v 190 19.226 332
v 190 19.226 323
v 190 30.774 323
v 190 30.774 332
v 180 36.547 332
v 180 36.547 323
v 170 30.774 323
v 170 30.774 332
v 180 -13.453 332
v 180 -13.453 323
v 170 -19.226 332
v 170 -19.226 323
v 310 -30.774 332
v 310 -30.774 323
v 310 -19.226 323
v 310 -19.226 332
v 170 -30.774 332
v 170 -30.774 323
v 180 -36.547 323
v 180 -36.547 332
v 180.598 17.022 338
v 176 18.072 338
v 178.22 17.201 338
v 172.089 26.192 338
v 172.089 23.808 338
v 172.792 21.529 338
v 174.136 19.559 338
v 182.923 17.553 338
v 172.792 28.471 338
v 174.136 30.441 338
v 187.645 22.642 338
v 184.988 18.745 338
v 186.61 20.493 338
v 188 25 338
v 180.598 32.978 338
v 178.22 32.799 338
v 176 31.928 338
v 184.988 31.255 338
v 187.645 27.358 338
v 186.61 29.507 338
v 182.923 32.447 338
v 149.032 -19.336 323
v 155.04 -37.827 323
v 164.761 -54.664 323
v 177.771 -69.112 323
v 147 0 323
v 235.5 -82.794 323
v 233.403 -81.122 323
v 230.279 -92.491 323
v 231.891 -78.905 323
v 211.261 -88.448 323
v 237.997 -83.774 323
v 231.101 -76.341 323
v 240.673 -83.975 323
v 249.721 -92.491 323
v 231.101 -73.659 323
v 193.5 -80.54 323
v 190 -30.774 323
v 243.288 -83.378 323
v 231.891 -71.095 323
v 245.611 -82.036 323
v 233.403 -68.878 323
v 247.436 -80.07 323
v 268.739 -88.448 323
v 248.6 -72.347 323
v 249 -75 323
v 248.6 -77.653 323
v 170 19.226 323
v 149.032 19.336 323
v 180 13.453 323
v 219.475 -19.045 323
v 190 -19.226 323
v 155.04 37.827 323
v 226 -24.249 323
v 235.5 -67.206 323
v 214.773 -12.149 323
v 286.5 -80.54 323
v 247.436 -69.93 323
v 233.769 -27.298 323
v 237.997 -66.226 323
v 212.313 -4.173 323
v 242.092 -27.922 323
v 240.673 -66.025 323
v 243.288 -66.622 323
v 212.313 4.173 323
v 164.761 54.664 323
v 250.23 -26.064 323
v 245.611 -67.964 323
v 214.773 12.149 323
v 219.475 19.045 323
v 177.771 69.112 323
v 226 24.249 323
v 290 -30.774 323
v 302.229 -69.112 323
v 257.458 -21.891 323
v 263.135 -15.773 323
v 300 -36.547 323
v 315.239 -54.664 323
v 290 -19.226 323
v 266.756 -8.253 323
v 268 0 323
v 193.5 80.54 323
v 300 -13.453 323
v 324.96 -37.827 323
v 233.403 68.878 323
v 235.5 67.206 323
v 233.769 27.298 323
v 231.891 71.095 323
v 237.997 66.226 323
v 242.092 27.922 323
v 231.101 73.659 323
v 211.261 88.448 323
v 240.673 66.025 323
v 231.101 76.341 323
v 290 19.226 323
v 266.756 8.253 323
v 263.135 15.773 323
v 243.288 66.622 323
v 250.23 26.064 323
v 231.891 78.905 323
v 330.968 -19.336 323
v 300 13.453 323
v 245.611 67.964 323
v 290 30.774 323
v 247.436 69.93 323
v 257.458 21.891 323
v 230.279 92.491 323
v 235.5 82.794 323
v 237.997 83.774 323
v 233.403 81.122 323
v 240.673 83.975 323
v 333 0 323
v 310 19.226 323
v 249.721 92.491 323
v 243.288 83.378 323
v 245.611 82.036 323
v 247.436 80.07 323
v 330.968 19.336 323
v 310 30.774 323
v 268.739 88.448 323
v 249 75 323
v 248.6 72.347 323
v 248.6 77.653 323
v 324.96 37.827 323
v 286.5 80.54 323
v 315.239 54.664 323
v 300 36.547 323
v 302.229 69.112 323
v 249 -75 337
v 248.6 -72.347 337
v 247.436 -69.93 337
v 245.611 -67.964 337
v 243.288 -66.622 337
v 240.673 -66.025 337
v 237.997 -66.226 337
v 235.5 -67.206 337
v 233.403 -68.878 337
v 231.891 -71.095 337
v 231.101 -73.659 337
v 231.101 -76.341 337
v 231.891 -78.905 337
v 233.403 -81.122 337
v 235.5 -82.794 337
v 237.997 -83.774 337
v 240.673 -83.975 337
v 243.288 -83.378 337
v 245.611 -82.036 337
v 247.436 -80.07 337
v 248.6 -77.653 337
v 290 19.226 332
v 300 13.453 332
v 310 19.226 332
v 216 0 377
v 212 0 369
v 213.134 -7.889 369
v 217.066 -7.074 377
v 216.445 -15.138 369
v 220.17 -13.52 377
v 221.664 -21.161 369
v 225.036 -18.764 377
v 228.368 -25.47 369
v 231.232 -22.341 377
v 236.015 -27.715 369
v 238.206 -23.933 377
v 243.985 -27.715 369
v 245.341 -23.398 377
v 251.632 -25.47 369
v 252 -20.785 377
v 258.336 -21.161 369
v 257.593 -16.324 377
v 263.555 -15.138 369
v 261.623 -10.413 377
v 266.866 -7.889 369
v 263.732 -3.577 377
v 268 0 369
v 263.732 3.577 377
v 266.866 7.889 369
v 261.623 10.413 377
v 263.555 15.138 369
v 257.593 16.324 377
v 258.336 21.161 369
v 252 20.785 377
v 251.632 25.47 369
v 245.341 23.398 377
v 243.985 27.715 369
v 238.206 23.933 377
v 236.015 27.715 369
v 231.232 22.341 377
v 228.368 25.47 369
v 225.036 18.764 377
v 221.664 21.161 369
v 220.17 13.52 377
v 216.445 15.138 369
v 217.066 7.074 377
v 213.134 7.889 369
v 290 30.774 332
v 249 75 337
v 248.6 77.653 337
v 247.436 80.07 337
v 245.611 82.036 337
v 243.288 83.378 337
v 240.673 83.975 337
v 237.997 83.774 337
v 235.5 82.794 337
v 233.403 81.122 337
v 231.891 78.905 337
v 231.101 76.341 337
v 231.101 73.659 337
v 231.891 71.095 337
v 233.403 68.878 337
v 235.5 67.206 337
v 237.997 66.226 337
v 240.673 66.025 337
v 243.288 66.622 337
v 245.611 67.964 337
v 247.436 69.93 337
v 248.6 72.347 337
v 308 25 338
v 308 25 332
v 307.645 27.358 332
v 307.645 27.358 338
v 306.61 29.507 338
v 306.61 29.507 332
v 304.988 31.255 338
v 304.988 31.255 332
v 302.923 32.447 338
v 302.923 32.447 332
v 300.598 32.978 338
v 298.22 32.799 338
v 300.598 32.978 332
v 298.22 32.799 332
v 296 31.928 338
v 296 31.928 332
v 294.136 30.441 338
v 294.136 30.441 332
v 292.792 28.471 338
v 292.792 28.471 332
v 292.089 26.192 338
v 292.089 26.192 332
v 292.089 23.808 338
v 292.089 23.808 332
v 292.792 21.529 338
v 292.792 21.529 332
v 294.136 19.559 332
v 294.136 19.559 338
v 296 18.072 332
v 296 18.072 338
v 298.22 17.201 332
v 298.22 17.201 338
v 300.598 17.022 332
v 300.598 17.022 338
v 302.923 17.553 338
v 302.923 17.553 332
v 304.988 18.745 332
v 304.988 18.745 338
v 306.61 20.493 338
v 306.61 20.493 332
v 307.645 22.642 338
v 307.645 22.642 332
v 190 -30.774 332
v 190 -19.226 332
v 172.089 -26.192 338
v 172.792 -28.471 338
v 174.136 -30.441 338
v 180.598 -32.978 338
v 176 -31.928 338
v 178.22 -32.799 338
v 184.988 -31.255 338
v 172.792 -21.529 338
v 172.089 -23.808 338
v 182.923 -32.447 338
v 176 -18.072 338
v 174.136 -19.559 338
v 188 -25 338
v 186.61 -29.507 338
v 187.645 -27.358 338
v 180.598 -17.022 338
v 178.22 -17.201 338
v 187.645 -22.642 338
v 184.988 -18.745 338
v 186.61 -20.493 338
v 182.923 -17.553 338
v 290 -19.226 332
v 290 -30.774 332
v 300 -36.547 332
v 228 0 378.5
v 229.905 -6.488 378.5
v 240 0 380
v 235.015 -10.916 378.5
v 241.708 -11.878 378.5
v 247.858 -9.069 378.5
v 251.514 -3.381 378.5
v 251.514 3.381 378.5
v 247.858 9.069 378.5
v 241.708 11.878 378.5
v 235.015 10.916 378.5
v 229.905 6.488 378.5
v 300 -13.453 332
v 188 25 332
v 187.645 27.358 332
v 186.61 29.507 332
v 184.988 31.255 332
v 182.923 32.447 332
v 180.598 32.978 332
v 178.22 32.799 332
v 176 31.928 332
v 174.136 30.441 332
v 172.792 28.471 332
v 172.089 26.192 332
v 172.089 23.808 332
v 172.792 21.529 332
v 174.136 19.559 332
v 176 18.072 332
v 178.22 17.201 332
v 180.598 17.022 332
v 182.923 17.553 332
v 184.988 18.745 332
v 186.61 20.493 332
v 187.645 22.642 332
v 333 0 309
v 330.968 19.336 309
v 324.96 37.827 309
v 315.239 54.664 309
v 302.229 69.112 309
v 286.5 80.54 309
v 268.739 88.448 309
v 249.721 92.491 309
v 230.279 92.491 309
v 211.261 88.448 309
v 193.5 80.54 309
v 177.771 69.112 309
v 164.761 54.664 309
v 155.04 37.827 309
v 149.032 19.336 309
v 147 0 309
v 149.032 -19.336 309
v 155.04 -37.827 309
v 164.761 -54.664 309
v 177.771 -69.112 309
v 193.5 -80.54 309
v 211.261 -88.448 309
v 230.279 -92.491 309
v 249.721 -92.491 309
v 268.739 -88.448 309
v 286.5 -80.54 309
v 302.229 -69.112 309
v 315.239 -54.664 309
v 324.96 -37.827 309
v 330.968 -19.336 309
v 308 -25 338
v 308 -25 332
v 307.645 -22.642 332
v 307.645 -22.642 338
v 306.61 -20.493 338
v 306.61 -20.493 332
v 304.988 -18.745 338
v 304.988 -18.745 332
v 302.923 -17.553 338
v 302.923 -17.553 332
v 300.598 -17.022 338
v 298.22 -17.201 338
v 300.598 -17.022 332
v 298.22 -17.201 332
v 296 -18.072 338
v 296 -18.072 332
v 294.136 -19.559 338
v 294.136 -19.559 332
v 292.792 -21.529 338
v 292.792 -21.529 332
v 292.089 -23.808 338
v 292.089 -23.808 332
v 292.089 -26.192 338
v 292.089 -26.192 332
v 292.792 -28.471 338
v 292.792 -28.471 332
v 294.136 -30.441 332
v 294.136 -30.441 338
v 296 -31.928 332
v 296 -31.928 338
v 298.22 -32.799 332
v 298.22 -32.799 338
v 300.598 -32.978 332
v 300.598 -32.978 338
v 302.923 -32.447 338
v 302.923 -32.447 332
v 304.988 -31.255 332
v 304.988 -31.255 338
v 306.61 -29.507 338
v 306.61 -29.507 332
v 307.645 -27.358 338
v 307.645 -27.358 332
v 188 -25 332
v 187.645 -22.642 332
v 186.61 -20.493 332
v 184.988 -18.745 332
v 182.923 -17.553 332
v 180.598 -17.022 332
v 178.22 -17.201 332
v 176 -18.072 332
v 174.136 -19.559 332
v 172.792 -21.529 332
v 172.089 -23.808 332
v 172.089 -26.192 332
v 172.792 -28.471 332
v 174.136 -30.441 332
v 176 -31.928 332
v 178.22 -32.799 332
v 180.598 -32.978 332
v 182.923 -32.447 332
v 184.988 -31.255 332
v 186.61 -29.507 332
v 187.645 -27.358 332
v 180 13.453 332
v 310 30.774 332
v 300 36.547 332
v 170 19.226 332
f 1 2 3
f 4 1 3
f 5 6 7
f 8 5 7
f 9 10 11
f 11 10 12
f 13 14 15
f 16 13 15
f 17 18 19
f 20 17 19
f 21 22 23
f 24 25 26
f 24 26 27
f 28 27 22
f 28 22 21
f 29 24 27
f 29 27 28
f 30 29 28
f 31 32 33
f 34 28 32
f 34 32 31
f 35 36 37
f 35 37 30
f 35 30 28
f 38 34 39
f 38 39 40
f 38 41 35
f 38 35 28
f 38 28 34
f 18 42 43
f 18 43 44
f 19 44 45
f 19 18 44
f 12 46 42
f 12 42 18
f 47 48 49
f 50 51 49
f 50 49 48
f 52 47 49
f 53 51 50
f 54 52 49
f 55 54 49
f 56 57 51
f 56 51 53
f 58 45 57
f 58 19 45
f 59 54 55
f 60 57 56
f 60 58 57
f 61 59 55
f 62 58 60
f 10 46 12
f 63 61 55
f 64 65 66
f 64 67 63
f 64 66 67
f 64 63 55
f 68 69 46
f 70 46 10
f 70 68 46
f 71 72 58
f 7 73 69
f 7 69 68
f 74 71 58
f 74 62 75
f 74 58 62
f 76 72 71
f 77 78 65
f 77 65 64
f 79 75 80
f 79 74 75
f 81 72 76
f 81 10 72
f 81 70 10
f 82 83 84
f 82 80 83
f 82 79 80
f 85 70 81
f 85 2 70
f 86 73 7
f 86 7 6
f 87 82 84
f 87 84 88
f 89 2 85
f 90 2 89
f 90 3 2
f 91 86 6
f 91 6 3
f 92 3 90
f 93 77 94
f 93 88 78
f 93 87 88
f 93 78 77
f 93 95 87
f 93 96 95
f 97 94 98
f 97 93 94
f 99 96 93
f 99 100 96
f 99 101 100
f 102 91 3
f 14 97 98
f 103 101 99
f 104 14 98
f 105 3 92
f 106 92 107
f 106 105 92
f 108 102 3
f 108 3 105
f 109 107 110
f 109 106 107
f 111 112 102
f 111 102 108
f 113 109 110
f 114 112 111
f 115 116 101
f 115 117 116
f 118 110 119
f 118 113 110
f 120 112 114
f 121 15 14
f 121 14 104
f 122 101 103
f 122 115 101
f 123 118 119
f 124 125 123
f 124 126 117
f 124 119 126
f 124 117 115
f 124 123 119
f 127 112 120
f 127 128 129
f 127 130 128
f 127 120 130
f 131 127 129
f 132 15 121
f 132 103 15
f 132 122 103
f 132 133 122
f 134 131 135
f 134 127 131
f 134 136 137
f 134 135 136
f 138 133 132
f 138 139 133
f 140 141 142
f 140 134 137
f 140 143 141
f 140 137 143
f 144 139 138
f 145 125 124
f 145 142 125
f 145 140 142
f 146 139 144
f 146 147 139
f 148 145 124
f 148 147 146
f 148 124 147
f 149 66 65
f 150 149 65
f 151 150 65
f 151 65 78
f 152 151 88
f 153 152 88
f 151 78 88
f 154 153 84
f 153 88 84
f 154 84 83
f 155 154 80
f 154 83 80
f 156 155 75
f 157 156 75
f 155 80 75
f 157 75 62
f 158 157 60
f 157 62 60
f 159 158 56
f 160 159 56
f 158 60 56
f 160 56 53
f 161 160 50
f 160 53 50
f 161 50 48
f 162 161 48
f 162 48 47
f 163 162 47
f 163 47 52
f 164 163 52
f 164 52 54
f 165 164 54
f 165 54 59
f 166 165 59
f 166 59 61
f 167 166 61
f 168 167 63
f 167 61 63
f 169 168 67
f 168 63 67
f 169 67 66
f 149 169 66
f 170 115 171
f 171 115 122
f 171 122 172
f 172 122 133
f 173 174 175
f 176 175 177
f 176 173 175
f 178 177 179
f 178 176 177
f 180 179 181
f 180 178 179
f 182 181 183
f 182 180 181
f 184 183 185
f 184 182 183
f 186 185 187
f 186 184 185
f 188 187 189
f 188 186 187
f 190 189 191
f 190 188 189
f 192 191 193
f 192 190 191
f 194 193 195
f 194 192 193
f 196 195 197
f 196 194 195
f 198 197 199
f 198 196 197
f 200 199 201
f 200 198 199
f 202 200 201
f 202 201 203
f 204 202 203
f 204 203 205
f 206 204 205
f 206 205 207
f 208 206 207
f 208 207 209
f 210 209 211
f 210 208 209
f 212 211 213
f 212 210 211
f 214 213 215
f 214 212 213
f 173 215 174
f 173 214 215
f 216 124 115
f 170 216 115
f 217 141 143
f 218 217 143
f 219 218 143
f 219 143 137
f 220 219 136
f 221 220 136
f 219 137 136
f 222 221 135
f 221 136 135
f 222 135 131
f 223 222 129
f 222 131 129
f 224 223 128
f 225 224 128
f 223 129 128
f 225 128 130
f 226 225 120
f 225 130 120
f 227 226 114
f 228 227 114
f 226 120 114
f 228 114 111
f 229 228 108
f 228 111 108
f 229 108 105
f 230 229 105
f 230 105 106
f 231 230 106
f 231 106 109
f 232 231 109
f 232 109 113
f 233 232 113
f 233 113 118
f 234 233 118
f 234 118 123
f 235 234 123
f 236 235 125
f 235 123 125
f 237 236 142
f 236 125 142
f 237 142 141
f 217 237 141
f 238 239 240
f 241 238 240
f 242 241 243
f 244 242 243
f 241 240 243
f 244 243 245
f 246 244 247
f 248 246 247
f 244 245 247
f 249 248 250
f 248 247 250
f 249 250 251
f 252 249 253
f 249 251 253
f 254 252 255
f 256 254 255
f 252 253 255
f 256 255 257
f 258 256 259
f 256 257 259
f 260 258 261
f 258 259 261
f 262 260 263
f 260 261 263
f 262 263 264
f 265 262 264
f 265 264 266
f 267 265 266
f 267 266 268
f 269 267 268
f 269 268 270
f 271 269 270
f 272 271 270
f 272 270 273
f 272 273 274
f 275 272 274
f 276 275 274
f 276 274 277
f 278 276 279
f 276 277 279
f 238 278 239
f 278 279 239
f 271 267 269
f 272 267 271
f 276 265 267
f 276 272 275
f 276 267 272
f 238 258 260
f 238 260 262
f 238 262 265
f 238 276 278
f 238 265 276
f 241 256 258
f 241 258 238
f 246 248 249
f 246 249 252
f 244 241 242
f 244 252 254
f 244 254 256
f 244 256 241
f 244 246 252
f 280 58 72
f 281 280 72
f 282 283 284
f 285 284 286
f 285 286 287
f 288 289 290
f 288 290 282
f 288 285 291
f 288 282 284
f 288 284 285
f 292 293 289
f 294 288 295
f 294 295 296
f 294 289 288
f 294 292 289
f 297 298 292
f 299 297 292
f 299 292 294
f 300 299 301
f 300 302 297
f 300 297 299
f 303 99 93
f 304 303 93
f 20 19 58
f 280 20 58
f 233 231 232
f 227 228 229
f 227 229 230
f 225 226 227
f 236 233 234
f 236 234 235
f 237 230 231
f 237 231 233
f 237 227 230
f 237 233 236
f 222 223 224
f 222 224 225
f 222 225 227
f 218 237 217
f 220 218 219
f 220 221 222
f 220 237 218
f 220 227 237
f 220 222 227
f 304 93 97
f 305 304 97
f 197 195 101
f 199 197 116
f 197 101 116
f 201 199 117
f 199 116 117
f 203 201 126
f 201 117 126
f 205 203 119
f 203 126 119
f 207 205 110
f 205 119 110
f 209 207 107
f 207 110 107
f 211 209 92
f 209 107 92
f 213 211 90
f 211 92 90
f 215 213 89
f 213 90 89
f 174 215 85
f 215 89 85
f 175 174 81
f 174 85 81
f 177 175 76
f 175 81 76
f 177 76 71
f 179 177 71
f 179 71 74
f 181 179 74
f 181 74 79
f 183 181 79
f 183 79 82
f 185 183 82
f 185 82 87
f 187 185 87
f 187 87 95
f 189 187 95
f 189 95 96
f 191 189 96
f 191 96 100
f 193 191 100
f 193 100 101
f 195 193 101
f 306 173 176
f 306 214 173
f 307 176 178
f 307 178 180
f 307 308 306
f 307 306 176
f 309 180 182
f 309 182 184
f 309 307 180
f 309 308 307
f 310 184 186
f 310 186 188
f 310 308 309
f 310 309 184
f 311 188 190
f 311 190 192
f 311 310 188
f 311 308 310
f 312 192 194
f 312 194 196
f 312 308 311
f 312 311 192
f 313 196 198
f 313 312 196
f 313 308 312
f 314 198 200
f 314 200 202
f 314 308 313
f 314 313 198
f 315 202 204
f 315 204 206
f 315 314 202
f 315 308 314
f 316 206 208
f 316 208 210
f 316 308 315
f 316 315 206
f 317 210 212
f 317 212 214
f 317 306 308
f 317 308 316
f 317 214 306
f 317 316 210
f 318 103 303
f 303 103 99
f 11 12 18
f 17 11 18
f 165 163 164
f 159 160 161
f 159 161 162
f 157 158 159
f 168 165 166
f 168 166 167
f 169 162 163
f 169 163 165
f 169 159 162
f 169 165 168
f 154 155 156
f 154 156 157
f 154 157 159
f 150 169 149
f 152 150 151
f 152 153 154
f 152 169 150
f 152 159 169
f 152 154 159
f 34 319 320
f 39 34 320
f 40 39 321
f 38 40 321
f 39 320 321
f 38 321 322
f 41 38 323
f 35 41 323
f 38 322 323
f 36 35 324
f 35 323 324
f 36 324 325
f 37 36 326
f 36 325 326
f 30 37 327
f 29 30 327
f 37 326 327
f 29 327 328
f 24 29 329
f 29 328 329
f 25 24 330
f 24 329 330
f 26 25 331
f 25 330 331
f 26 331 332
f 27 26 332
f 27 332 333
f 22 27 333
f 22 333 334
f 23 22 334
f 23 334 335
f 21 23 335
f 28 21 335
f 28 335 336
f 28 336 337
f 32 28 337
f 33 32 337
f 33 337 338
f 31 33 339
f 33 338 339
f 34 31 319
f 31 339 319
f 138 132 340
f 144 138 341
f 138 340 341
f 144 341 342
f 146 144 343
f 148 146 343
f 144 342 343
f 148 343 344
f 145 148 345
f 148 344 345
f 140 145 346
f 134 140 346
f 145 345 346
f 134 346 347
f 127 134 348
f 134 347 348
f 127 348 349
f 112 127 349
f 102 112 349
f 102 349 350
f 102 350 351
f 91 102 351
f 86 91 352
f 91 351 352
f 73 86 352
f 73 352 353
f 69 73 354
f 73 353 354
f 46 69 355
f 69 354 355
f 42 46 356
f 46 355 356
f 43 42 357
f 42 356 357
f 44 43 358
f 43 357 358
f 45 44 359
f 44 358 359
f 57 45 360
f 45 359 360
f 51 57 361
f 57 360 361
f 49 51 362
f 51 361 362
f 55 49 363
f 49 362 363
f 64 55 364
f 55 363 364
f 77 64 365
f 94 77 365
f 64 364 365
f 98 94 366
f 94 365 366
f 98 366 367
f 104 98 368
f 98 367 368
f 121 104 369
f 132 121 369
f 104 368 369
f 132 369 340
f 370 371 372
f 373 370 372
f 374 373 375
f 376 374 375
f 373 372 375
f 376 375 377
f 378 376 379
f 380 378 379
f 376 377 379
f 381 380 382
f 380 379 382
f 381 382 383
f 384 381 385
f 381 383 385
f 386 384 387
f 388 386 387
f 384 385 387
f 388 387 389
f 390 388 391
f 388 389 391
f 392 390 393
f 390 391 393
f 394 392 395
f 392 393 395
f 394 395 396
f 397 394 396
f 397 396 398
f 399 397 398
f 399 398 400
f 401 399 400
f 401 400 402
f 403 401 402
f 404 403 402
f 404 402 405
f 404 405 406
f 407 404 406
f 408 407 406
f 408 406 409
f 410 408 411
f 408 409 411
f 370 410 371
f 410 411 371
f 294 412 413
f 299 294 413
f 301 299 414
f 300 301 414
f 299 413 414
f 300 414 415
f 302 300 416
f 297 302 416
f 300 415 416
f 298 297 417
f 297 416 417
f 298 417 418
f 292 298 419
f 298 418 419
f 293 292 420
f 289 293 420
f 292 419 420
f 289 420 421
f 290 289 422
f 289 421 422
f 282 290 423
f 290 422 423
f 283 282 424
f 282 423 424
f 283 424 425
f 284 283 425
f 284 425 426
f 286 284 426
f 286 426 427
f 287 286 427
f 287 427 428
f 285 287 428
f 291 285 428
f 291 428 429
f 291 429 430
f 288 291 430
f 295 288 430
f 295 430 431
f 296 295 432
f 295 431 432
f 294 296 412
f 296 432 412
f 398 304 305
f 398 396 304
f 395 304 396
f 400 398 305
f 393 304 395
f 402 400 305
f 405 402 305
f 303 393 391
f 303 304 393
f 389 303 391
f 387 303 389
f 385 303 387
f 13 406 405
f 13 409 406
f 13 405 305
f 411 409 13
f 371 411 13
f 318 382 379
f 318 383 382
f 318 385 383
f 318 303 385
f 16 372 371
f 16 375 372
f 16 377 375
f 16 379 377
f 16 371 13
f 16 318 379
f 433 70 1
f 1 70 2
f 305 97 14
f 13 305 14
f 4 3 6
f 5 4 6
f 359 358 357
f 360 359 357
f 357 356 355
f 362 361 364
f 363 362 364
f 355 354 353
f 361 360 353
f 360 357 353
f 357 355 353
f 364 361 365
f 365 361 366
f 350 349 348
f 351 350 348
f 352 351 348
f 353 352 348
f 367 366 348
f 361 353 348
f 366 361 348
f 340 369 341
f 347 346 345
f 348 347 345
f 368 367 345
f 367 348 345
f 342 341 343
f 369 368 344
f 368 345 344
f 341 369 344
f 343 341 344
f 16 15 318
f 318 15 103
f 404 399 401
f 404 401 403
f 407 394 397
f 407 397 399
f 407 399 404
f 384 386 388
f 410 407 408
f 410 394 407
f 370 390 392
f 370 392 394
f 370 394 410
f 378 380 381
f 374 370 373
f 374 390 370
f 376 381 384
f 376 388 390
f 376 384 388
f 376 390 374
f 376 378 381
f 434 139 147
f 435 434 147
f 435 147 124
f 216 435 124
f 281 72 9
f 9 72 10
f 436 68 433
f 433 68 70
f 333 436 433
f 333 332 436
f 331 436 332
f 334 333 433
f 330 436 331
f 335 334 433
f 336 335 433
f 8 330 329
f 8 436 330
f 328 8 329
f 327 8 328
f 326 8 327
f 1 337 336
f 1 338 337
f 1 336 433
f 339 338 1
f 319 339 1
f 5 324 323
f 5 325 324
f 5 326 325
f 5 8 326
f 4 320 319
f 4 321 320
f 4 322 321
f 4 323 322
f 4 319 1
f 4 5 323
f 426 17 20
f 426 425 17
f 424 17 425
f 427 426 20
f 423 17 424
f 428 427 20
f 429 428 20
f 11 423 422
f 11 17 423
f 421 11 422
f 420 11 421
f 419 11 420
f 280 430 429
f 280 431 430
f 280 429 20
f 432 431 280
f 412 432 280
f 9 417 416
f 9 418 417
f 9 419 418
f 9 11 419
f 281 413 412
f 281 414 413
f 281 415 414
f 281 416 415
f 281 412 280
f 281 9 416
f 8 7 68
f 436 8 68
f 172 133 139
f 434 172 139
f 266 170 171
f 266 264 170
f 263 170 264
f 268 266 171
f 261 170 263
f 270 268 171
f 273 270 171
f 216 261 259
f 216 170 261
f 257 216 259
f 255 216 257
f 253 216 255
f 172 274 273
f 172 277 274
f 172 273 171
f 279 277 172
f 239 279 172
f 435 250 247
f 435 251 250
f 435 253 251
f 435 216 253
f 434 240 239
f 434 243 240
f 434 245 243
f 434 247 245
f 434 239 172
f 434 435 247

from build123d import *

# Parameters (mm, degrees)
EXTRUDE_START       = 309
EXTRUDE_SKETCH_1_R  = 93
EXTRUDE_1_DEPTH     = 14
EXTRUDE_START_2     = 323
EXTRUDE_SKETCH_2_R  = 28
EXTRUDE_2_DEPTH     = 46
EXTRUDE_3_DEPTH     = 9
EXTRUDE_START_3     = 332
EXTRUDE_SKETCH_4_R  = 8
EXTRUDE_4_DEPTH     = 6
EXTRUDE_5_DEPTH     = 9
EXTRUDE_SKETCH_6_R  = 8
EXTRUDE_6_DEPTH     = 6
EXTRUDE_7_DEPTH     = 9
EXTRUDE_SKETCH_8_R  = 8
EXTRUDE_8_DEPTH     = 6
EXTRUDE_9_DEPTH     = 9
EXTRUDE_SKETCH_10_R = 8
EXTRUDE_10_DEPTH    = 6
EXTRUDE_SKETCH_11_R = 9
EXTRUDE_11_DEPTH    = 14
EXTRUDE_SKETCH_12_R = 9
EXTRUDE_12_DEPTH    = 14


with BuildPart() as part:
    # Extrude sketch 1 → Extrude 1 (new body)
    with BuildSketch(Plane.XY.offset(EXTRUDE_START)):
        with Locations((240, 0)):
            Circle(EXTRUDE_SKETCH_1_R)
    extrude(amount=EXTRUDE_1_DEPTH)


with BuildPart() as body_2:
    # Extrude sketch 2 → Extrude 2 (new body)
    with BuildSketch(Plane.XY.offset(EXTRUDE_START_2)):
        with Locations((240, 0)):
            Circle(EXTRUDE_SKETCH_2_R)
    extrude(amount=EXTRUDE_2_DEPTH)


with BuildPart() as body_3:
    # Revolve profile 1 → Revolve 1 (revolve)
    with BuildSketch(Plane(origin=(0, 0, 0), x_dir=(1, 0, 0), z_dir=(0, 1, 0))):
        Polygon((240, -369), (268, -369), (264, -377), (240, -380), align=None)
    revolve(axis=Axis((240, 0, 364), (0, 0, 1)))


with BuildPart() as body_4:
    # Extrude sketch 3 → Extrude 3 (new body)
    with BuildSketch(Plane.XY.offset(EXTRUDE_START_2)):
        Polygon((310, 30.773502692), (300, 36.547005384), (290, 30.773502692), (290, 19.226497308), (300, 13.452994616), (310, 19.226497308), align=None)
    extrude(amount=EXTRUDE_3_DEPTH)


with BuildPart() as body_5:
    # Extrude sketch 4 → Extrude 4 (new body)
    with BuildSketch(Plane.XY.offset(EXTRUDE_START_3)):
        with Locations((300, 25)):
            Circle(EXTRUDE_SKETCH_4_R)
    extrude(amount=EXTRUDE_4_DEPTH)


with BuildPart() as body_6:
    # Extrude sketch 5 → Extrude 5 (new body)
    with BuildSketch(Plane.XY.offset(EXTRUDE_START_2)):
        Polygon((310, -19.226497308), (300, -13.452994616), (290, -19.226497308), (290, -30.773502692), (300, -36.547005384), (310, -30.773502692), align=None)
    extrude(amount=EXTRUDE_5_DEPTH)


with BuildPart() as body_7:
    # Extrude sketch 6 → Extrude 6 (new body)
    with BuildSketch(Plane.XY.offset(EXTRUDE_START_3)):
        with Locations((300, -25)):
            Circle(EXTRUDE_SKETCH_6_R)
    extrude(amount=EXTRUDE_6_DEPTH)


with BuildPart() as body_8:
    # Extrude sketch 7 → Extrude 7 (new body)
    with BuildSketch(Plane.XY.offset(EXTRUDE_START_2)):
        Polygon((190, 30.773502692), (180, 36.547005384), (170, 30.773502692), (170, 19.226497308), (180, 13.452994616), (190, 19.226497308), align=None)
    extrude(amount=EXTRUDE_7_DEPTH)


with BuildPart() as body_9:
    # Extrude sketch 8 → Extrude 8 (new body)
    with BuildSketch(Plane.XY.offset(EXTRUDE_START_3)):
        with Locations((180, 25)):
            Circle(EXTRUDE_SKETCH_8_R)
    extrude(amount=EXTRUDE_8_DEPTH)


with BuildPart() as body_10:
    # Extrude sketch 9 → Extrude 9 (new body)
    with BuildSketch(Plane.XY.offset(EXTRUDE_START_2)):
        Polygon((190, -19.226497308), (180, -13.452994616), (170, -19.226497308), (170, -30.773502692), (180, -36.547005384), (190, -30.773502692), align=None)
    extrude(amount=EXTRUDE_9_DEPTH)


with BuildPart() as body_11:
    # Extrude sketch 10 → Extrude 10 (new body)
    with BuildSketch(Plane.XY.offset(EXTRUDE_START_3)):
        with Locations((180, -25)):
            Circle(EXTRUDE_SKETCH_10_R)
    extrude(amount=EXTRUDE_10_DEPTH)


with BuildPart() as body_12:
    # Extrude sketch 11 → Extrude 11 (new body)
    with BuildSketch(Plane.XY.offset(EXTRUDE_START_2)):
        with Locations((240, 75)):
            Circle(EXTRUDE_SKETCH_11_R)
    extrude(amount=EXTRUDE_11_DEPTH)


with BuildPart() as body_13:
    # Extrude sketch 12 → Extrude 12 (new body)
    with BuildSketch(Plane.XY.offset(EXTRUDE_START_2)):
        with Locations((240, -75)):
            Circle(EXTRUDE_SKETCH_12_R)
    extrude(amount=EXTRUDE_12_DEPTH)


with BuildPart() as body_10_1:
    add(body_10.part)

    # Combine (weld / assembly of features): union body 4, body 9, body 5, body 11, body 2, body 12, body 8, body 6, body 3, body 13, body 7, part
    add(body_4.part)
    add(body_9.part)
    add(body_5.part)
    add(body_11.part)
    add(body_2.part)
    add(body_12.part)
    add(body_8.part)
    add(body_6.part)
    add(body_3.part)
    add(body_13.part)
    add(body_7.part)
    add(part.part)


solid = body_10_1.part
